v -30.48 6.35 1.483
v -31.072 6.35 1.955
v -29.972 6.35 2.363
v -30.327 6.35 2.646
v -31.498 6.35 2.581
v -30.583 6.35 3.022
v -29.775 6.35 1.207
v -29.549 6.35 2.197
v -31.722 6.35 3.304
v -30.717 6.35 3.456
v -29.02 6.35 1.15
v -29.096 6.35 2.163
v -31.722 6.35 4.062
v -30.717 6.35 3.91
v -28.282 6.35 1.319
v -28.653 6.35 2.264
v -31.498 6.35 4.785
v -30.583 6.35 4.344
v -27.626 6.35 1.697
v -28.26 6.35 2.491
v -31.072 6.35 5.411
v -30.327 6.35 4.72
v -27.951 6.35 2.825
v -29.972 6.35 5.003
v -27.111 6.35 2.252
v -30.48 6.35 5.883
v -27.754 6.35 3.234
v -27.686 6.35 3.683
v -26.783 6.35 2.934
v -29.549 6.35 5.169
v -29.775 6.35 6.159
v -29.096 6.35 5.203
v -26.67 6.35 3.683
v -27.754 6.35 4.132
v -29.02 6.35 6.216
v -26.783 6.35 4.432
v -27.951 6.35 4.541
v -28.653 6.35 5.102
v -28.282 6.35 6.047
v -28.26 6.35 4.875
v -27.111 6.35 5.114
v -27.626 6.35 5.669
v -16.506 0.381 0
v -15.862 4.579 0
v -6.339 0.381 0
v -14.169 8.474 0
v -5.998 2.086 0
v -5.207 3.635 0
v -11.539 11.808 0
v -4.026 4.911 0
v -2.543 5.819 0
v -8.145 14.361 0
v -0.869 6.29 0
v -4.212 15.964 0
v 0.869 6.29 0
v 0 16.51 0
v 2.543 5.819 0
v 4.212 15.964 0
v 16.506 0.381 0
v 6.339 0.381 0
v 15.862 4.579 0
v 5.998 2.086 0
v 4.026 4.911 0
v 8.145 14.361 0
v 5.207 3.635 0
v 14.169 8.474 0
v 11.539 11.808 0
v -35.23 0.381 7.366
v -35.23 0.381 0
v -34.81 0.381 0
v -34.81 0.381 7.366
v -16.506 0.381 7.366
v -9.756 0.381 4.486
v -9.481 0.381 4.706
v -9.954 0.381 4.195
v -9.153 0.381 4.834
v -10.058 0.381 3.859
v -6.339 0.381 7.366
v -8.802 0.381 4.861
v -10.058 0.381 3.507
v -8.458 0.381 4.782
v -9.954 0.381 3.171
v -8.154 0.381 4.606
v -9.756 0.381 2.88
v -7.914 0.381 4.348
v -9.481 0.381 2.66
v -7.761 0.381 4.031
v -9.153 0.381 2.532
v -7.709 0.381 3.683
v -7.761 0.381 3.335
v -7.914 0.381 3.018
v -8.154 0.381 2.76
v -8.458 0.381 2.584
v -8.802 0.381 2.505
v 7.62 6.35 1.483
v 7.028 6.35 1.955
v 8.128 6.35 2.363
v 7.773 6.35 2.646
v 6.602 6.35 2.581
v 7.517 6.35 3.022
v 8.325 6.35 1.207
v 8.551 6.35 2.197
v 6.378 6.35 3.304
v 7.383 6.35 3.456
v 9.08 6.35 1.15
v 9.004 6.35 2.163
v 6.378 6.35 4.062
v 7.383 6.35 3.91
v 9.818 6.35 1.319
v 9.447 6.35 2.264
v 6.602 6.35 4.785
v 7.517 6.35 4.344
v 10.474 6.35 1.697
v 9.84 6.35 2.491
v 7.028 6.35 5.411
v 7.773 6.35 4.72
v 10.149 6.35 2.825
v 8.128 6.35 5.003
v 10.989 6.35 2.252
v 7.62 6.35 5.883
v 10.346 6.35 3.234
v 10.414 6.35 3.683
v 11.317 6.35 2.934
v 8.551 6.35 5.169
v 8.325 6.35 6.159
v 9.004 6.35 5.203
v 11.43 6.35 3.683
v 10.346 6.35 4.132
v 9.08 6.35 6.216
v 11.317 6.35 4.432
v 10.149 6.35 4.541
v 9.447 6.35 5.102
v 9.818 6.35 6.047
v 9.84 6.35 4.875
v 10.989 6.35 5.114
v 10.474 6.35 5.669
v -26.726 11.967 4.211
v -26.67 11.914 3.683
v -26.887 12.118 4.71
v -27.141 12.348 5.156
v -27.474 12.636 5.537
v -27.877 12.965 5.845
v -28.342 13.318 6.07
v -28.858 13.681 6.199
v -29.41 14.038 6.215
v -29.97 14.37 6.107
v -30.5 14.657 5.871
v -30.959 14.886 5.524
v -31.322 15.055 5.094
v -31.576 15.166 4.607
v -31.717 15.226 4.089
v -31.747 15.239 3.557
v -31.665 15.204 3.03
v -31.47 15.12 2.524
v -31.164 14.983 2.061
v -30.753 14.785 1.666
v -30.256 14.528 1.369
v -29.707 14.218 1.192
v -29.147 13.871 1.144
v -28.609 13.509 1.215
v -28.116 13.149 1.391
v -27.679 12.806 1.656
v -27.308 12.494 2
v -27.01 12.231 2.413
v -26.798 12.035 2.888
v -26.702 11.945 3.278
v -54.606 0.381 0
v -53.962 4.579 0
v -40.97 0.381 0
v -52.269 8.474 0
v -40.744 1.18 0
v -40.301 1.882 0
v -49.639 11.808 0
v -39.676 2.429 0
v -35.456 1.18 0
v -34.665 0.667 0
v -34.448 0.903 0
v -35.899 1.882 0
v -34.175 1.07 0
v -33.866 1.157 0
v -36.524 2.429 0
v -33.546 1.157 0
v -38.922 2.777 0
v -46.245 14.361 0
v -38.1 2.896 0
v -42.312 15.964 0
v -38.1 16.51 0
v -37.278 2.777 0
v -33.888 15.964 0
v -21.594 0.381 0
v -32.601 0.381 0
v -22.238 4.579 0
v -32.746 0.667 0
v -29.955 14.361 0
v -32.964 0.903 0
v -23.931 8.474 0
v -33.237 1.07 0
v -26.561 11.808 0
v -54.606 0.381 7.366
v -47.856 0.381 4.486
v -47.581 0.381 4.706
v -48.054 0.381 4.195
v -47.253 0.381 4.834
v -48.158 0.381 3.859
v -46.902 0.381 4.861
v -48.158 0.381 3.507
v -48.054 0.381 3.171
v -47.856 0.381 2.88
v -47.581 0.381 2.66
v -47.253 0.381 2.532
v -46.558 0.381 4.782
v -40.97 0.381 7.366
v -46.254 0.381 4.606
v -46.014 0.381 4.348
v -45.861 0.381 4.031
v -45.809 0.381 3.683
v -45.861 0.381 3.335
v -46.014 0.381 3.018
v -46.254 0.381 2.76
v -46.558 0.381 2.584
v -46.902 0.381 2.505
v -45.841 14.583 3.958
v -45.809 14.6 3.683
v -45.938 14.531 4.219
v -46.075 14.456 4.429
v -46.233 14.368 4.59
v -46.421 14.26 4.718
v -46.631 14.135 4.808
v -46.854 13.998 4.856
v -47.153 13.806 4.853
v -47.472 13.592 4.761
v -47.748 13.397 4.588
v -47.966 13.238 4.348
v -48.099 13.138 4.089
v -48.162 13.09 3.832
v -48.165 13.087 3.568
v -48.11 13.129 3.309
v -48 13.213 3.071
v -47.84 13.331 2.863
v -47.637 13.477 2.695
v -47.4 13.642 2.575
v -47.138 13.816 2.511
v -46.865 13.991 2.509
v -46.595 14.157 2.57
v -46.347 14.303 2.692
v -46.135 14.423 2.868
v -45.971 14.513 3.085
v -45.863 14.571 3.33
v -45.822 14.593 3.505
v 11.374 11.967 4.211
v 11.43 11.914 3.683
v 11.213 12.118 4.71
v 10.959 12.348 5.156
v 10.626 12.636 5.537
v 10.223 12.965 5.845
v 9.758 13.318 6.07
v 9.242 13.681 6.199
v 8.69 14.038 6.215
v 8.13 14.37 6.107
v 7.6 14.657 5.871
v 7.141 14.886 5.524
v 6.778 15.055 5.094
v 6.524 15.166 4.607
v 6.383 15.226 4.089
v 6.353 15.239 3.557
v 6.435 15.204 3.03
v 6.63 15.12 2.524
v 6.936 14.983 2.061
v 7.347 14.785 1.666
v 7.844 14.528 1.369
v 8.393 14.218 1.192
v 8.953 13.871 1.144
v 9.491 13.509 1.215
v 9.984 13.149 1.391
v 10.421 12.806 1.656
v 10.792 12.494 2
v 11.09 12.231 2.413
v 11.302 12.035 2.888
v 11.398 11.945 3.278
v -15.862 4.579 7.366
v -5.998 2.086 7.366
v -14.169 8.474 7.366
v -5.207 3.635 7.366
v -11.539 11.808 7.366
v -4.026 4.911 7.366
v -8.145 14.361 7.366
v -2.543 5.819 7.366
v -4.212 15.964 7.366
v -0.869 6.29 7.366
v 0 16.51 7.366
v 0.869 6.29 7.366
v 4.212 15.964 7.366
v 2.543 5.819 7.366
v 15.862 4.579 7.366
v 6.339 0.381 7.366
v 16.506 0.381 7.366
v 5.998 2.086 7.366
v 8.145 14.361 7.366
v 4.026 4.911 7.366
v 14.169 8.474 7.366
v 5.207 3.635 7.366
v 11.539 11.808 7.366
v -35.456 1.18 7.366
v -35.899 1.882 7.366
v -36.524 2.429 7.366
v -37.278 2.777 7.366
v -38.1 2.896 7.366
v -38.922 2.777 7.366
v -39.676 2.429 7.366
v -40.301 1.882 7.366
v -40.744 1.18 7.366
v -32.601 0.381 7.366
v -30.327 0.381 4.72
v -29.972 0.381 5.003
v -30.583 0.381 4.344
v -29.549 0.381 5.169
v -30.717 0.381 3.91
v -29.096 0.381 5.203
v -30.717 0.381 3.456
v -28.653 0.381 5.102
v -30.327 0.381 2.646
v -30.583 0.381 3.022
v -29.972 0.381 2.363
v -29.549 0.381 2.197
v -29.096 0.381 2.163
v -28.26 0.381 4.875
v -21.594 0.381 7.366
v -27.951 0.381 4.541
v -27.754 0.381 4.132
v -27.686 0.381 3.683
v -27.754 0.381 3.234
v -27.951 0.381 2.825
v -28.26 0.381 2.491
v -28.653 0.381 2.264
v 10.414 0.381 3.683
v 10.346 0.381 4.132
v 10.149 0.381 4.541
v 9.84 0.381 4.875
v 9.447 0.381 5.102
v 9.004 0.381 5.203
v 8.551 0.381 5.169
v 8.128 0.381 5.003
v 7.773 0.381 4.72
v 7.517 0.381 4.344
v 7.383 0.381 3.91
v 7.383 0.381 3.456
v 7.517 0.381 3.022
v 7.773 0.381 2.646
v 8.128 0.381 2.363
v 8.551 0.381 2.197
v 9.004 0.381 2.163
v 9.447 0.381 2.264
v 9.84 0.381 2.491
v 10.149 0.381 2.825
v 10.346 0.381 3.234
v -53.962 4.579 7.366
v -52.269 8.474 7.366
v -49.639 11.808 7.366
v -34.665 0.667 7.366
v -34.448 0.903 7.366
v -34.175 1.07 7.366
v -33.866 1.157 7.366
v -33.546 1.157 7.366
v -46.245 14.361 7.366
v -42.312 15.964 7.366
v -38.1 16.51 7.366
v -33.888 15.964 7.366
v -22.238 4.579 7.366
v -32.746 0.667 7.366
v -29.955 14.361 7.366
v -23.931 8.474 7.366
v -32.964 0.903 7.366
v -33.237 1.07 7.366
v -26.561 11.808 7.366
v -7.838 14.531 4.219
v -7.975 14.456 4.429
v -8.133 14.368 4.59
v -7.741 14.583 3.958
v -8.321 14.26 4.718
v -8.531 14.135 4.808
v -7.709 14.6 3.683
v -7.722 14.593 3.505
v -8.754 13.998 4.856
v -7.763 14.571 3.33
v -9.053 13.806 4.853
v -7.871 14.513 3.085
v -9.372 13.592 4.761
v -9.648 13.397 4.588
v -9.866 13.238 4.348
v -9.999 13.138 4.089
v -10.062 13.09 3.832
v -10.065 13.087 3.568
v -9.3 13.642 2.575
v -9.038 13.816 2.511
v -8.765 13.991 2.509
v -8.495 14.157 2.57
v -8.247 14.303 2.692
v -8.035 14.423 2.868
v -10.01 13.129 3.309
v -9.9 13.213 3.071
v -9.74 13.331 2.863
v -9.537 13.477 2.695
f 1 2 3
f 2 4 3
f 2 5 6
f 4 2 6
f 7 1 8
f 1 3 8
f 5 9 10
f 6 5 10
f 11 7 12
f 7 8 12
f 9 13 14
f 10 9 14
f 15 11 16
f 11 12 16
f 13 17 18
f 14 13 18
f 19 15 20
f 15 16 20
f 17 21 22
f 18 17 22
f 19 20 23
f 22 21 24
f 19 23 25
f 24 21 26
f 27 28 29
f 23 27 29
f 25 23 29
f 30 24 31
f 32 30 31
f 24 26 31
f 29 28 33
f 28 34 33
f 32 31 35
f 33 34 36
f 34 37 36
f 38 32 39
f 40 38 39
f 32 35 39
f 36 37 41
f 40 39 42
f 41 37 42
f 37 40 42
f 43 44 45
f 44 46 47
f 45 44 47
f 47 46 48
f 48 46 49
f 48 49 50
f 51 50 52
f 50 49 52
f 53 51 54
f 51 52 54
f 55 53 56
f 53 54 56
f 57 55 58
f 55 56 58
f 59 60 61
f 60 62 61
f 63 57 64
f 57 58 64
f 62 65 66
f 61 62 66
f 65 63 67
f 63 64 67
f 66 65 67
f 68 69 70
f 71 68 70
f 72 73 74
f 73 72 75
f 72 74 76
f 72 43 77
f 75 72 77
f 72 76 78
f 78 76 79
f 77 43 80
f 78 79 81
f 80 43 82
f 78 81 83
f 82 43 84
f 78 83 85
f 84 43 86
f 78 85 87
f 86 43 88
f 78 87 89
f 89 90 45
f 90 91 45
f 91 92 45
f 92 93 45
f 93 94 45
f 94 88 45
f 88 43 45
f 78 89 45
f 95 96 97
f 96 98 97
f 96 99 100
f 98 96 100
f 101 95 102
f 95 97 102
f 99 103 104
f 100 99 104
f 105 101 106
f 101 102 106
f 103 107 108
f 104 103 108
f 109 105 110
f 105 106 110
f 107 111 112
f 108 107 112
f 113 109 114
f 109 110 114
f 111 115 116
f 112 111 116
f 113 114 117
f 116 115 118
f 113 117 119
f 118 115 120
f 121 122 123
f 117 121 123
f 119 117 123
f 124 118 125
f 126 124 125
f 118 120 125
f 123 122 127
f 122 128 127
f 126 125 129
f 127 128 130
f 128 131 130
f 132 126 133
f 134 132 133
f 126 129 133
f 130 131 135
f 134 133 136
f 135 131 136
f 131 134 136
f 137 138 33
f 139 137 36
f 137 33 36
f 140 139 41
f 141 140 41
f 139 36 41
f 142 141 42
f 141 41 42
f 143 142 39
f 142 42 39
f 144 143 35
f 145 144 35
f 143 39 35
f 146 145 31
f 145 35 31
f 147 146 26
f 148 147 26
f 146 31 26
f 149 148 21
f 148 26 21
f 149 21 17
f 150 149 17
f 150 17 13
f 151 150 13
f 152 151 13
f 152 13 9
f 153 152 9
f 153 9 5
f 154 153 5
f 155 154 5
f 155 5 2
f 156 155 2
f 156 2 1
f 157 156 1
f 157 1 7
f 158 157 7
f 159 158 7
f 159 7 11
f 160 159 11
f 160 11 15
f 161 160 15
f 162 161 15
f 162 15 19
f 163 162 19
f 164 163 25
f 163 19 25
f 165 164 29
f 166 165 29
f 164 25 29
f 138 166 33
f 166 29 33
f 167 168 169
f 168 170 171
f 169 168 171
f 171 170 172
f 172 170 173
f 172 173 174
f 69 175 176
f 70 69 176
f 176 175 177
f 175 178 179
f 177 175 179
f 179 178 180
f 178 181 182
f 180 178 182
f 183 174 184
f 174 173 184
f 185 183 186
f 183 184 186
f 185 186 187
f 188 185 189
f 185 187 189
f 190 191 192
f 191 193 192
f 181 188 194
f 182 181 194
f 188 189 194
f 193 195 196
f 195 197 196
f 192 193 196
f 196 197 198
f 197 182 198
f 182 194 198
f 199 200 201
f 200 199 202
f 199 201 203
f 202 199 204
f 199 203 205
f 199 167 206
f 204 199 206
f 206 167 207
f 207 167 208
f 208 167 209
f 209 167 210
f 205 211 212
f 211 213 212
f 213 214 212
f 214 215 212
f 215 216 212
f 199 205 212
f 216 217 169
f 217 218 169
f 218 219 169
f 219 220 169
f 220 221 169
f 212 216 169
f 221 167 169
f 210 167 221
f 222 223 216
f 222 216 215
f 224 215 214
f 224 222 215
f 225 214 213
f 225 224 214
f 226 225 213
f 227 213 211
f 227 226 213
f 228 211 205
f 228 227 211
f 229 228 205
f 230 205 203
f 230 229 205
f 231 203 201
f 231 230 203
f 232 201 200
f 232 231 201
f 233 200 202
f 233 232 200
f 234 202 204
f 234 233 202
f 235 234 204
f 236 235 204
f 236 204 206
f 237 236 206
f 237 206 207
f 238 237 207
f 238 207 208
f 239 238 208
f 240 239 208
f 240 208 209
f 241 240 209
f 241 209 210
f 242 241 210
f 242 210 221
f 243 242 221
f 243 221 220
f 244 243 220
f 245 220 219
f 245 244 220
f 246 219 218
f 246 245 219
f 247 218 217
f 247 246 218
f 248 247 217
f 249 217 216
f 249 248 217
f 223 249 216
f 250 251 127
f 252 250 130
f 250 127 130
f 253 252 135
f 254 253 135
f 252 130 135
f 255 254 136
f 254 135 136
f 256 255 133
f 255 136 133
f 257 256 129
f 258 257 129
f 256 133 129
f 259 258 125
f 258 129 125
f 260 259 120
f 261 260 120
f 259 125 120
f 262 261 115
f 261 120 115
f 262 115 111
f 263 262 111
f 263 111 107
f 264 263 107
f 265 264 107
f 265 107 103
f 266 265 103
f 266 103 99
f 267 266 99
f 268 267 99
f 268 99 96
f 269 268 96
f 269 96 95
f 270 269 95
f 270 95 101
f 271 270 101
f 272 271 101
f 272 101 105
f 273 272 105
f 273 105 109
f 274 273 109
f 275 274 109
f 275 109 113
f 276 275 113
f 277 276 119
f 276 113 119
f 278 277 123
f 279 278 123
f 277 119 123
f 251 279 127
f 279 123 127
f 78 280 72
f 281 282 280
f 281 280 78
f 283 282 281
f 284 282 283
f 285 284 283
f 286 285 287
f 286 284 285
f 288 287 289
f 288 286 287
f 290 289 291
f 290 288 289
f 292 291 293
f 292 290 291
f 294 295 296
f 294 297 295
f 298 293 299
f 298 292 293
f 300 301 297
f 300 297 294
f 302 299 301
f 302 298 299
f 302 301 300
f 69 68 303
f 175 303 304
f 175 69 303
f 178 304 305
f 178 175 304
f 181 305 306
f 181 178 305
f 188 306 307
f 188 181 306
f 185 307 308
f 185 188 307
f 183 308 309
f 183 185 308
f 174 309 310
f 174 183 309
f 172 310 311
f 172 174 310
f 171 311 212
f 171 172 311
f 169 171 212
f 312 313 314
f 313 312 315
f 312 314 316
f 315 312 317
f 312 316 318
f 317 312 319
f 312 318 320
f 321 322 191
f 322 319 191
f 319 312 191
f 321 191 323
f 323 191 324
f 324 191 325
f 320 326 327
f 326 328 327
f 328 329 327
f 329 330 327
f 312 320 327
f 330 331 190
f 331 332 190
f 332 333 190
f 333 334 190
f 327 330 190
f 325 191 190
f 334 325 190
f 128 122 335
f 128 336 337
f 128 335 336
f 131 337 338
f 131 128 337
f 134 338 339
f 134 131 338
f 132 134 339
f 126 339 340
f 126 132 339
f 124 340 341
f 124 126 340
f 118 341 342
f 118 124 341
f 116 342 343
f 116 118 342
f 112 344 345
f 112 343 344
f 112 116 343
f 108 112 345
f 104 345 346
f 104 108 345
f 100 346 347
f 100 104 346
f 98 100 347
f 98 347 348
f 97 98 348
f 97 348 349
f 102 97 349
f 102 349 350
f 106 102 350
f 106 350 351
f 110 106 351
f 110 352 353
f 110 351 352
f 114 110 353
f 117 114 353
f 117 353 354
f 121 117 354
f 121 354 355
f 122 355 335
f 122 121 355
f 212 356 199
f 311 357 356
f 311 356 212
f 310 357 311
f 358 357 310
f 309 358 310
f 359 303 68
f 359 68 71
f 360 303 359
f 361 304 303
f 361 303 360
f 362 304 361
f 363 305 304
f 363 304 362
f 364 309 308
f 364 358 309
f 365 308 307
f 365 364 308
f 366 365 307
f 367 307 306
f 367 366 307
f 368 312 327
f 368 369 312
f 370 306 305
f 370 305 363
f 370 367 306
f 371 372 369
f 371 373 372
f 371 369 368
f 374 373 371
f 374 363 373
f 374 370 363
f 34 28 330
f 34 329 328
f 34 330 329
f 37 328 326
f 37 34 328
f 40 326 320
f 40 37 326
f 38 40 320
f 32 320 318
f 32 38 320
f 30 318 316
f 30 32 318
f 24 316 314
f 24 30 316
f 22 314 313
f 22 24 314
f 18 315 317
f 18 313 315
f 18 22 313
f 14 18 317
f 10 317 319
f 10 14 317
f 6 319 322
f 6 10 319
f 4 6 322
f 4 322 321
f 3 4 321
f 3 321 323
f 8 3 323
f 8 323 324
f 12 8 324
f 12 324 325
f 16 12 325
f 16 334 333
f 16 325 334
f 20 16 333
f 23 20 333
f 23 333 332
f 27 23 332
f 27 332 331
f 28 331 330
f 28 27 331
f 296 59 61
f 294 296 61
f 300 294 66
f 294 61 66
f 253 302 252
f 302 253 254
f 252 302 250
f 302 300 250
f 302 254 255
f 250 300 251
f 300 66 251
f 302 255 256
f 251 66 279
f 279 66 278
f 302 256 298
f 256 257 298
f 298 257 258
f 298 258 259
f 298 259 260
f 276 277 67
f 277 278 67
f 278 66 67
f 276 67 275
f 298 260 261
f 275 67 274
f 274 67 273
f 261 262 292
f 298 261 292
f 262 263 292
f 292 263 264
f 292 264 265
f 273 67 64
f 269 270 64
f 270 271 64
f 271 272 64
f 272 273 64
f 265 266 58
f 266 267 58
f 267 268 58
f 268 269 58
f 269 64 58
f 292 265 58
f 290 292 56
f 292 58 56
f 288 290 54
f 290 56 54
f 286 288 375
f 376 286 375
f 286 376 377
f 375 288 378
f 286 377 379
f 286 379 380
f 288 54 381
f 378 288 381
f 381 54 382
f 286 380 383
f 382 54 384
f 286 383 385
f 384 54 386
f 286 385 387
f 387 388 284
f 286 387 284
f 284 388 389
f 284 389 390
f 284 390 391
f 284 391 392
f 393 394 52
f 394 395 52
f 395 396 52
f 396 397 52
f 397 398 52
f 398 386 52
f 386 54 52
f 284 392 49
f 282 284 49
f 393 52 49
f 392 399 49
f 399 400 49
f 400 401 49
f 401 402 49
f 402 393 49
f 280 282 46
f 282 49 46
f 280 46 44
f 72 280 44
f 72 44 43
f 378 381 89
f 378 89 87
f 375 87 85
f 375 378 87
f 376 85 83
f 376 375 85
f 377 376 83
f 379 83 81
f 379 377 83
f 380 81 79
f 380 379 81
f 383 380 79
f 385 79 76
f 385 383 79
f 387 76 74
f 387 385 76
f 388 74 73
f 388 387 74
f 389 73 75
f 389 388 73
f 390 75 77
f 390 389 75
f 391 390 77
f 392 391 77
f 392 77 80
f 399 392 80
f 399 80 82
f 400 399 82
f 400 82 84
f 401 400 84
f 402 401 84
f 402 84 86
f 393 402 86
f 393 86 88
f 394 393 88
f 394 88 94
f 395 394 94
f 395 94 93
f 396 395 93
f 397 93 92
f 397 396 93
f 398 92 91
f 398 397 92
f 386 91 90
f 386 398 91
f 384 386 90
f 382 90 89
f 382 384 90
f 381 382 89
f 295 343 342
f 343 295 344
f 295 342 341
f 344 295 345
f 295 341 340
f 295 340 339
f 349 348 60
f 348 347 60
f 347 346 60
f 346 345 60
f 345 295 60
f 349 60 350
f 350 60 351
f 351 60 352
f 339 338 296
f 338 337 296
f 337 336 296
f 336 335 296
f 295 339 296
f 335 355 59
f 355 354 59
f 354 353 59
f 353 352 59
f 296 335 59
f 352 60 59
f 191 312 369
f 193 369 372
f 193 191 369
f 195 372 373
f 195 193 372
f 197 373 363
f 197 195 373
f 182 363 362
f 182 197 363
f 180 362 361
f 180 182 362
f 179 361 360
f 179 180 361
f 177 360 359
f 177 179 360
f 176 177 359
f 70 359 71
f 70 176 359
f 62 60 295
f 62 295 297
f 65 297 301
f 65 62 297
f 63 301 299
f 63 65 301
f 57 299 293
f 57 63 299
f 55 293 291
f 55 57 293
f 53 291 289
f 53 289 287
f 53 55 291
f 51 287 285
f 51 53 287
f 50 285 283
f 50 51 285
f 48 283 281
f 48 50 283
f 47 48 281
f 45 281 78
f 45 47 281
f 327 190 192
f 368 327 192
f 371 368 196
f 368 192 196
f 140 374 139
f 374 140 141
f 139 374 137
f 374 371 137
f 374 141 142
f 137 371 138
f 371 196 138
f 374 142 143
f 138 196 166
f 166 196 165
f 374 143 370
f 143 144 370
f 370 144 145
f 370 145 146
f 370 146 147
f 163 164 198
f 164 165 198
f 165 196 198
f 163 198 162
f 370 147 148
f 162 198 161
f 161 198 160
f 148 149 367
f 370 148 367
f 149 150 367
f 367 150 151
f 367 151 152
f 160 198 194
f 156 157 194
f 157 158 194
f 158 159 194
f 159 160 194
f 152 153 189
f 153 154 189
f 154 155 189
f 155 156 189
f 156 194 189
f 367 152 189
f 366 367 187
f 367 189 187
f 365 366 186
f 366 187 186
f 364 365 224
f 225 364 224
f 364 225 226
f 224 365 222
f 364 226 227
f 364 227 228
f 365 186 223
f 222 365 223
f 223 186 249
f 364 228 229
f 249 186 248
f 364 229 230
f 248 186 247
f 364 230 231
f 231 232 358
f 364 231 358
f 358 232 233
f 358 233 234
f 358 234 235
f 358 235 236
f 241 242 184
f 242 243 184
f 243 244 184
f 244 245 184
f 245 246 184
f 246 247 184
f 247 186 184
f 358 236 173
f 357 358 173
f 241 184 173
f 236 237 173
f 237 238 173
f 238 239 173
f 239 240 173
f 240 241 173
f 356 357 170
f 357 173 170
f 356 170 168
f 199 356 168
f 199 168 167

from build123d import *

# Parameters (mm, degrees)
F0_R     = 16.51
F0_R_2   = 2.8956
F0_R_3   = 1.1684
F0_R_4   = 6.35
F1_DEPTH = 7.366
F2_W     = 88.9
F2_H     = 25.781
F3_DEPTH = 25.4
F5_R     = 1.524
F5_R_2   = 1.1811
F6_DEPTH = 25.4
F8_R     = 2.54
F9_DEPTH = 25.4


with BuildPart() as f1:
    # F0 (on Top) → F1 (new body)
    with BuildSketch(Plane.XY):
        with Locations((-38.1, 0)):
            Circle(F0_R)
        with Locations((-38.1, 0)):
            Circle(F0_R_2, mode=Mode.SUBTRACT)
        with Locations((-33.7058, 0)):
            Circle(F0_R_3, mode=Mode.SUBTRACT)
        Circle(F0_R)
        Circle(F0_R_4, mode=Mode.SUBTRACT)
    extrude(amount=F1_DEPTH)

    # F2 (on Top) → F3 (cut)
    with BuildSketch(Plane.XY):
        with Locations((-26.67, -12.5095)):
            Rectangle(F2_W, F2_H)
    extrude(amount=F3_DEPTH, mode=Mode.SUBTRACT)

    # F5 (on offset) → F6 (cut)
    with BuildSketch(Plane.XZ.offset(-25.4)):
        with Locations((8.89, 3.683)):
            Circle(F5_R)
        with Locations((-8.89, 3.683)):
            Circle(F5_R_2)
        with Locations((-46.99, 3.683)):
            Circle(F5_R_2)
        with Locations((-29.21, 3.683)):
            Circle(F5_R)
    extrude(amount=F6_DEPTH, mode=Mode.SUBTRACT)

    # F8 (on offset) → F9 (cut)
    with BuildSketch(Plane.XZ.offset(-6.35)):
        with Locations((8.89, 3.683)):
            Circle(F8_R)
        with Locations((-29.21, 3.683)):
            Circle(F8_R)
    extrude(amount=-F9_DEPTH, mode=Mode.SUBTRACT)


solid = f1.part
